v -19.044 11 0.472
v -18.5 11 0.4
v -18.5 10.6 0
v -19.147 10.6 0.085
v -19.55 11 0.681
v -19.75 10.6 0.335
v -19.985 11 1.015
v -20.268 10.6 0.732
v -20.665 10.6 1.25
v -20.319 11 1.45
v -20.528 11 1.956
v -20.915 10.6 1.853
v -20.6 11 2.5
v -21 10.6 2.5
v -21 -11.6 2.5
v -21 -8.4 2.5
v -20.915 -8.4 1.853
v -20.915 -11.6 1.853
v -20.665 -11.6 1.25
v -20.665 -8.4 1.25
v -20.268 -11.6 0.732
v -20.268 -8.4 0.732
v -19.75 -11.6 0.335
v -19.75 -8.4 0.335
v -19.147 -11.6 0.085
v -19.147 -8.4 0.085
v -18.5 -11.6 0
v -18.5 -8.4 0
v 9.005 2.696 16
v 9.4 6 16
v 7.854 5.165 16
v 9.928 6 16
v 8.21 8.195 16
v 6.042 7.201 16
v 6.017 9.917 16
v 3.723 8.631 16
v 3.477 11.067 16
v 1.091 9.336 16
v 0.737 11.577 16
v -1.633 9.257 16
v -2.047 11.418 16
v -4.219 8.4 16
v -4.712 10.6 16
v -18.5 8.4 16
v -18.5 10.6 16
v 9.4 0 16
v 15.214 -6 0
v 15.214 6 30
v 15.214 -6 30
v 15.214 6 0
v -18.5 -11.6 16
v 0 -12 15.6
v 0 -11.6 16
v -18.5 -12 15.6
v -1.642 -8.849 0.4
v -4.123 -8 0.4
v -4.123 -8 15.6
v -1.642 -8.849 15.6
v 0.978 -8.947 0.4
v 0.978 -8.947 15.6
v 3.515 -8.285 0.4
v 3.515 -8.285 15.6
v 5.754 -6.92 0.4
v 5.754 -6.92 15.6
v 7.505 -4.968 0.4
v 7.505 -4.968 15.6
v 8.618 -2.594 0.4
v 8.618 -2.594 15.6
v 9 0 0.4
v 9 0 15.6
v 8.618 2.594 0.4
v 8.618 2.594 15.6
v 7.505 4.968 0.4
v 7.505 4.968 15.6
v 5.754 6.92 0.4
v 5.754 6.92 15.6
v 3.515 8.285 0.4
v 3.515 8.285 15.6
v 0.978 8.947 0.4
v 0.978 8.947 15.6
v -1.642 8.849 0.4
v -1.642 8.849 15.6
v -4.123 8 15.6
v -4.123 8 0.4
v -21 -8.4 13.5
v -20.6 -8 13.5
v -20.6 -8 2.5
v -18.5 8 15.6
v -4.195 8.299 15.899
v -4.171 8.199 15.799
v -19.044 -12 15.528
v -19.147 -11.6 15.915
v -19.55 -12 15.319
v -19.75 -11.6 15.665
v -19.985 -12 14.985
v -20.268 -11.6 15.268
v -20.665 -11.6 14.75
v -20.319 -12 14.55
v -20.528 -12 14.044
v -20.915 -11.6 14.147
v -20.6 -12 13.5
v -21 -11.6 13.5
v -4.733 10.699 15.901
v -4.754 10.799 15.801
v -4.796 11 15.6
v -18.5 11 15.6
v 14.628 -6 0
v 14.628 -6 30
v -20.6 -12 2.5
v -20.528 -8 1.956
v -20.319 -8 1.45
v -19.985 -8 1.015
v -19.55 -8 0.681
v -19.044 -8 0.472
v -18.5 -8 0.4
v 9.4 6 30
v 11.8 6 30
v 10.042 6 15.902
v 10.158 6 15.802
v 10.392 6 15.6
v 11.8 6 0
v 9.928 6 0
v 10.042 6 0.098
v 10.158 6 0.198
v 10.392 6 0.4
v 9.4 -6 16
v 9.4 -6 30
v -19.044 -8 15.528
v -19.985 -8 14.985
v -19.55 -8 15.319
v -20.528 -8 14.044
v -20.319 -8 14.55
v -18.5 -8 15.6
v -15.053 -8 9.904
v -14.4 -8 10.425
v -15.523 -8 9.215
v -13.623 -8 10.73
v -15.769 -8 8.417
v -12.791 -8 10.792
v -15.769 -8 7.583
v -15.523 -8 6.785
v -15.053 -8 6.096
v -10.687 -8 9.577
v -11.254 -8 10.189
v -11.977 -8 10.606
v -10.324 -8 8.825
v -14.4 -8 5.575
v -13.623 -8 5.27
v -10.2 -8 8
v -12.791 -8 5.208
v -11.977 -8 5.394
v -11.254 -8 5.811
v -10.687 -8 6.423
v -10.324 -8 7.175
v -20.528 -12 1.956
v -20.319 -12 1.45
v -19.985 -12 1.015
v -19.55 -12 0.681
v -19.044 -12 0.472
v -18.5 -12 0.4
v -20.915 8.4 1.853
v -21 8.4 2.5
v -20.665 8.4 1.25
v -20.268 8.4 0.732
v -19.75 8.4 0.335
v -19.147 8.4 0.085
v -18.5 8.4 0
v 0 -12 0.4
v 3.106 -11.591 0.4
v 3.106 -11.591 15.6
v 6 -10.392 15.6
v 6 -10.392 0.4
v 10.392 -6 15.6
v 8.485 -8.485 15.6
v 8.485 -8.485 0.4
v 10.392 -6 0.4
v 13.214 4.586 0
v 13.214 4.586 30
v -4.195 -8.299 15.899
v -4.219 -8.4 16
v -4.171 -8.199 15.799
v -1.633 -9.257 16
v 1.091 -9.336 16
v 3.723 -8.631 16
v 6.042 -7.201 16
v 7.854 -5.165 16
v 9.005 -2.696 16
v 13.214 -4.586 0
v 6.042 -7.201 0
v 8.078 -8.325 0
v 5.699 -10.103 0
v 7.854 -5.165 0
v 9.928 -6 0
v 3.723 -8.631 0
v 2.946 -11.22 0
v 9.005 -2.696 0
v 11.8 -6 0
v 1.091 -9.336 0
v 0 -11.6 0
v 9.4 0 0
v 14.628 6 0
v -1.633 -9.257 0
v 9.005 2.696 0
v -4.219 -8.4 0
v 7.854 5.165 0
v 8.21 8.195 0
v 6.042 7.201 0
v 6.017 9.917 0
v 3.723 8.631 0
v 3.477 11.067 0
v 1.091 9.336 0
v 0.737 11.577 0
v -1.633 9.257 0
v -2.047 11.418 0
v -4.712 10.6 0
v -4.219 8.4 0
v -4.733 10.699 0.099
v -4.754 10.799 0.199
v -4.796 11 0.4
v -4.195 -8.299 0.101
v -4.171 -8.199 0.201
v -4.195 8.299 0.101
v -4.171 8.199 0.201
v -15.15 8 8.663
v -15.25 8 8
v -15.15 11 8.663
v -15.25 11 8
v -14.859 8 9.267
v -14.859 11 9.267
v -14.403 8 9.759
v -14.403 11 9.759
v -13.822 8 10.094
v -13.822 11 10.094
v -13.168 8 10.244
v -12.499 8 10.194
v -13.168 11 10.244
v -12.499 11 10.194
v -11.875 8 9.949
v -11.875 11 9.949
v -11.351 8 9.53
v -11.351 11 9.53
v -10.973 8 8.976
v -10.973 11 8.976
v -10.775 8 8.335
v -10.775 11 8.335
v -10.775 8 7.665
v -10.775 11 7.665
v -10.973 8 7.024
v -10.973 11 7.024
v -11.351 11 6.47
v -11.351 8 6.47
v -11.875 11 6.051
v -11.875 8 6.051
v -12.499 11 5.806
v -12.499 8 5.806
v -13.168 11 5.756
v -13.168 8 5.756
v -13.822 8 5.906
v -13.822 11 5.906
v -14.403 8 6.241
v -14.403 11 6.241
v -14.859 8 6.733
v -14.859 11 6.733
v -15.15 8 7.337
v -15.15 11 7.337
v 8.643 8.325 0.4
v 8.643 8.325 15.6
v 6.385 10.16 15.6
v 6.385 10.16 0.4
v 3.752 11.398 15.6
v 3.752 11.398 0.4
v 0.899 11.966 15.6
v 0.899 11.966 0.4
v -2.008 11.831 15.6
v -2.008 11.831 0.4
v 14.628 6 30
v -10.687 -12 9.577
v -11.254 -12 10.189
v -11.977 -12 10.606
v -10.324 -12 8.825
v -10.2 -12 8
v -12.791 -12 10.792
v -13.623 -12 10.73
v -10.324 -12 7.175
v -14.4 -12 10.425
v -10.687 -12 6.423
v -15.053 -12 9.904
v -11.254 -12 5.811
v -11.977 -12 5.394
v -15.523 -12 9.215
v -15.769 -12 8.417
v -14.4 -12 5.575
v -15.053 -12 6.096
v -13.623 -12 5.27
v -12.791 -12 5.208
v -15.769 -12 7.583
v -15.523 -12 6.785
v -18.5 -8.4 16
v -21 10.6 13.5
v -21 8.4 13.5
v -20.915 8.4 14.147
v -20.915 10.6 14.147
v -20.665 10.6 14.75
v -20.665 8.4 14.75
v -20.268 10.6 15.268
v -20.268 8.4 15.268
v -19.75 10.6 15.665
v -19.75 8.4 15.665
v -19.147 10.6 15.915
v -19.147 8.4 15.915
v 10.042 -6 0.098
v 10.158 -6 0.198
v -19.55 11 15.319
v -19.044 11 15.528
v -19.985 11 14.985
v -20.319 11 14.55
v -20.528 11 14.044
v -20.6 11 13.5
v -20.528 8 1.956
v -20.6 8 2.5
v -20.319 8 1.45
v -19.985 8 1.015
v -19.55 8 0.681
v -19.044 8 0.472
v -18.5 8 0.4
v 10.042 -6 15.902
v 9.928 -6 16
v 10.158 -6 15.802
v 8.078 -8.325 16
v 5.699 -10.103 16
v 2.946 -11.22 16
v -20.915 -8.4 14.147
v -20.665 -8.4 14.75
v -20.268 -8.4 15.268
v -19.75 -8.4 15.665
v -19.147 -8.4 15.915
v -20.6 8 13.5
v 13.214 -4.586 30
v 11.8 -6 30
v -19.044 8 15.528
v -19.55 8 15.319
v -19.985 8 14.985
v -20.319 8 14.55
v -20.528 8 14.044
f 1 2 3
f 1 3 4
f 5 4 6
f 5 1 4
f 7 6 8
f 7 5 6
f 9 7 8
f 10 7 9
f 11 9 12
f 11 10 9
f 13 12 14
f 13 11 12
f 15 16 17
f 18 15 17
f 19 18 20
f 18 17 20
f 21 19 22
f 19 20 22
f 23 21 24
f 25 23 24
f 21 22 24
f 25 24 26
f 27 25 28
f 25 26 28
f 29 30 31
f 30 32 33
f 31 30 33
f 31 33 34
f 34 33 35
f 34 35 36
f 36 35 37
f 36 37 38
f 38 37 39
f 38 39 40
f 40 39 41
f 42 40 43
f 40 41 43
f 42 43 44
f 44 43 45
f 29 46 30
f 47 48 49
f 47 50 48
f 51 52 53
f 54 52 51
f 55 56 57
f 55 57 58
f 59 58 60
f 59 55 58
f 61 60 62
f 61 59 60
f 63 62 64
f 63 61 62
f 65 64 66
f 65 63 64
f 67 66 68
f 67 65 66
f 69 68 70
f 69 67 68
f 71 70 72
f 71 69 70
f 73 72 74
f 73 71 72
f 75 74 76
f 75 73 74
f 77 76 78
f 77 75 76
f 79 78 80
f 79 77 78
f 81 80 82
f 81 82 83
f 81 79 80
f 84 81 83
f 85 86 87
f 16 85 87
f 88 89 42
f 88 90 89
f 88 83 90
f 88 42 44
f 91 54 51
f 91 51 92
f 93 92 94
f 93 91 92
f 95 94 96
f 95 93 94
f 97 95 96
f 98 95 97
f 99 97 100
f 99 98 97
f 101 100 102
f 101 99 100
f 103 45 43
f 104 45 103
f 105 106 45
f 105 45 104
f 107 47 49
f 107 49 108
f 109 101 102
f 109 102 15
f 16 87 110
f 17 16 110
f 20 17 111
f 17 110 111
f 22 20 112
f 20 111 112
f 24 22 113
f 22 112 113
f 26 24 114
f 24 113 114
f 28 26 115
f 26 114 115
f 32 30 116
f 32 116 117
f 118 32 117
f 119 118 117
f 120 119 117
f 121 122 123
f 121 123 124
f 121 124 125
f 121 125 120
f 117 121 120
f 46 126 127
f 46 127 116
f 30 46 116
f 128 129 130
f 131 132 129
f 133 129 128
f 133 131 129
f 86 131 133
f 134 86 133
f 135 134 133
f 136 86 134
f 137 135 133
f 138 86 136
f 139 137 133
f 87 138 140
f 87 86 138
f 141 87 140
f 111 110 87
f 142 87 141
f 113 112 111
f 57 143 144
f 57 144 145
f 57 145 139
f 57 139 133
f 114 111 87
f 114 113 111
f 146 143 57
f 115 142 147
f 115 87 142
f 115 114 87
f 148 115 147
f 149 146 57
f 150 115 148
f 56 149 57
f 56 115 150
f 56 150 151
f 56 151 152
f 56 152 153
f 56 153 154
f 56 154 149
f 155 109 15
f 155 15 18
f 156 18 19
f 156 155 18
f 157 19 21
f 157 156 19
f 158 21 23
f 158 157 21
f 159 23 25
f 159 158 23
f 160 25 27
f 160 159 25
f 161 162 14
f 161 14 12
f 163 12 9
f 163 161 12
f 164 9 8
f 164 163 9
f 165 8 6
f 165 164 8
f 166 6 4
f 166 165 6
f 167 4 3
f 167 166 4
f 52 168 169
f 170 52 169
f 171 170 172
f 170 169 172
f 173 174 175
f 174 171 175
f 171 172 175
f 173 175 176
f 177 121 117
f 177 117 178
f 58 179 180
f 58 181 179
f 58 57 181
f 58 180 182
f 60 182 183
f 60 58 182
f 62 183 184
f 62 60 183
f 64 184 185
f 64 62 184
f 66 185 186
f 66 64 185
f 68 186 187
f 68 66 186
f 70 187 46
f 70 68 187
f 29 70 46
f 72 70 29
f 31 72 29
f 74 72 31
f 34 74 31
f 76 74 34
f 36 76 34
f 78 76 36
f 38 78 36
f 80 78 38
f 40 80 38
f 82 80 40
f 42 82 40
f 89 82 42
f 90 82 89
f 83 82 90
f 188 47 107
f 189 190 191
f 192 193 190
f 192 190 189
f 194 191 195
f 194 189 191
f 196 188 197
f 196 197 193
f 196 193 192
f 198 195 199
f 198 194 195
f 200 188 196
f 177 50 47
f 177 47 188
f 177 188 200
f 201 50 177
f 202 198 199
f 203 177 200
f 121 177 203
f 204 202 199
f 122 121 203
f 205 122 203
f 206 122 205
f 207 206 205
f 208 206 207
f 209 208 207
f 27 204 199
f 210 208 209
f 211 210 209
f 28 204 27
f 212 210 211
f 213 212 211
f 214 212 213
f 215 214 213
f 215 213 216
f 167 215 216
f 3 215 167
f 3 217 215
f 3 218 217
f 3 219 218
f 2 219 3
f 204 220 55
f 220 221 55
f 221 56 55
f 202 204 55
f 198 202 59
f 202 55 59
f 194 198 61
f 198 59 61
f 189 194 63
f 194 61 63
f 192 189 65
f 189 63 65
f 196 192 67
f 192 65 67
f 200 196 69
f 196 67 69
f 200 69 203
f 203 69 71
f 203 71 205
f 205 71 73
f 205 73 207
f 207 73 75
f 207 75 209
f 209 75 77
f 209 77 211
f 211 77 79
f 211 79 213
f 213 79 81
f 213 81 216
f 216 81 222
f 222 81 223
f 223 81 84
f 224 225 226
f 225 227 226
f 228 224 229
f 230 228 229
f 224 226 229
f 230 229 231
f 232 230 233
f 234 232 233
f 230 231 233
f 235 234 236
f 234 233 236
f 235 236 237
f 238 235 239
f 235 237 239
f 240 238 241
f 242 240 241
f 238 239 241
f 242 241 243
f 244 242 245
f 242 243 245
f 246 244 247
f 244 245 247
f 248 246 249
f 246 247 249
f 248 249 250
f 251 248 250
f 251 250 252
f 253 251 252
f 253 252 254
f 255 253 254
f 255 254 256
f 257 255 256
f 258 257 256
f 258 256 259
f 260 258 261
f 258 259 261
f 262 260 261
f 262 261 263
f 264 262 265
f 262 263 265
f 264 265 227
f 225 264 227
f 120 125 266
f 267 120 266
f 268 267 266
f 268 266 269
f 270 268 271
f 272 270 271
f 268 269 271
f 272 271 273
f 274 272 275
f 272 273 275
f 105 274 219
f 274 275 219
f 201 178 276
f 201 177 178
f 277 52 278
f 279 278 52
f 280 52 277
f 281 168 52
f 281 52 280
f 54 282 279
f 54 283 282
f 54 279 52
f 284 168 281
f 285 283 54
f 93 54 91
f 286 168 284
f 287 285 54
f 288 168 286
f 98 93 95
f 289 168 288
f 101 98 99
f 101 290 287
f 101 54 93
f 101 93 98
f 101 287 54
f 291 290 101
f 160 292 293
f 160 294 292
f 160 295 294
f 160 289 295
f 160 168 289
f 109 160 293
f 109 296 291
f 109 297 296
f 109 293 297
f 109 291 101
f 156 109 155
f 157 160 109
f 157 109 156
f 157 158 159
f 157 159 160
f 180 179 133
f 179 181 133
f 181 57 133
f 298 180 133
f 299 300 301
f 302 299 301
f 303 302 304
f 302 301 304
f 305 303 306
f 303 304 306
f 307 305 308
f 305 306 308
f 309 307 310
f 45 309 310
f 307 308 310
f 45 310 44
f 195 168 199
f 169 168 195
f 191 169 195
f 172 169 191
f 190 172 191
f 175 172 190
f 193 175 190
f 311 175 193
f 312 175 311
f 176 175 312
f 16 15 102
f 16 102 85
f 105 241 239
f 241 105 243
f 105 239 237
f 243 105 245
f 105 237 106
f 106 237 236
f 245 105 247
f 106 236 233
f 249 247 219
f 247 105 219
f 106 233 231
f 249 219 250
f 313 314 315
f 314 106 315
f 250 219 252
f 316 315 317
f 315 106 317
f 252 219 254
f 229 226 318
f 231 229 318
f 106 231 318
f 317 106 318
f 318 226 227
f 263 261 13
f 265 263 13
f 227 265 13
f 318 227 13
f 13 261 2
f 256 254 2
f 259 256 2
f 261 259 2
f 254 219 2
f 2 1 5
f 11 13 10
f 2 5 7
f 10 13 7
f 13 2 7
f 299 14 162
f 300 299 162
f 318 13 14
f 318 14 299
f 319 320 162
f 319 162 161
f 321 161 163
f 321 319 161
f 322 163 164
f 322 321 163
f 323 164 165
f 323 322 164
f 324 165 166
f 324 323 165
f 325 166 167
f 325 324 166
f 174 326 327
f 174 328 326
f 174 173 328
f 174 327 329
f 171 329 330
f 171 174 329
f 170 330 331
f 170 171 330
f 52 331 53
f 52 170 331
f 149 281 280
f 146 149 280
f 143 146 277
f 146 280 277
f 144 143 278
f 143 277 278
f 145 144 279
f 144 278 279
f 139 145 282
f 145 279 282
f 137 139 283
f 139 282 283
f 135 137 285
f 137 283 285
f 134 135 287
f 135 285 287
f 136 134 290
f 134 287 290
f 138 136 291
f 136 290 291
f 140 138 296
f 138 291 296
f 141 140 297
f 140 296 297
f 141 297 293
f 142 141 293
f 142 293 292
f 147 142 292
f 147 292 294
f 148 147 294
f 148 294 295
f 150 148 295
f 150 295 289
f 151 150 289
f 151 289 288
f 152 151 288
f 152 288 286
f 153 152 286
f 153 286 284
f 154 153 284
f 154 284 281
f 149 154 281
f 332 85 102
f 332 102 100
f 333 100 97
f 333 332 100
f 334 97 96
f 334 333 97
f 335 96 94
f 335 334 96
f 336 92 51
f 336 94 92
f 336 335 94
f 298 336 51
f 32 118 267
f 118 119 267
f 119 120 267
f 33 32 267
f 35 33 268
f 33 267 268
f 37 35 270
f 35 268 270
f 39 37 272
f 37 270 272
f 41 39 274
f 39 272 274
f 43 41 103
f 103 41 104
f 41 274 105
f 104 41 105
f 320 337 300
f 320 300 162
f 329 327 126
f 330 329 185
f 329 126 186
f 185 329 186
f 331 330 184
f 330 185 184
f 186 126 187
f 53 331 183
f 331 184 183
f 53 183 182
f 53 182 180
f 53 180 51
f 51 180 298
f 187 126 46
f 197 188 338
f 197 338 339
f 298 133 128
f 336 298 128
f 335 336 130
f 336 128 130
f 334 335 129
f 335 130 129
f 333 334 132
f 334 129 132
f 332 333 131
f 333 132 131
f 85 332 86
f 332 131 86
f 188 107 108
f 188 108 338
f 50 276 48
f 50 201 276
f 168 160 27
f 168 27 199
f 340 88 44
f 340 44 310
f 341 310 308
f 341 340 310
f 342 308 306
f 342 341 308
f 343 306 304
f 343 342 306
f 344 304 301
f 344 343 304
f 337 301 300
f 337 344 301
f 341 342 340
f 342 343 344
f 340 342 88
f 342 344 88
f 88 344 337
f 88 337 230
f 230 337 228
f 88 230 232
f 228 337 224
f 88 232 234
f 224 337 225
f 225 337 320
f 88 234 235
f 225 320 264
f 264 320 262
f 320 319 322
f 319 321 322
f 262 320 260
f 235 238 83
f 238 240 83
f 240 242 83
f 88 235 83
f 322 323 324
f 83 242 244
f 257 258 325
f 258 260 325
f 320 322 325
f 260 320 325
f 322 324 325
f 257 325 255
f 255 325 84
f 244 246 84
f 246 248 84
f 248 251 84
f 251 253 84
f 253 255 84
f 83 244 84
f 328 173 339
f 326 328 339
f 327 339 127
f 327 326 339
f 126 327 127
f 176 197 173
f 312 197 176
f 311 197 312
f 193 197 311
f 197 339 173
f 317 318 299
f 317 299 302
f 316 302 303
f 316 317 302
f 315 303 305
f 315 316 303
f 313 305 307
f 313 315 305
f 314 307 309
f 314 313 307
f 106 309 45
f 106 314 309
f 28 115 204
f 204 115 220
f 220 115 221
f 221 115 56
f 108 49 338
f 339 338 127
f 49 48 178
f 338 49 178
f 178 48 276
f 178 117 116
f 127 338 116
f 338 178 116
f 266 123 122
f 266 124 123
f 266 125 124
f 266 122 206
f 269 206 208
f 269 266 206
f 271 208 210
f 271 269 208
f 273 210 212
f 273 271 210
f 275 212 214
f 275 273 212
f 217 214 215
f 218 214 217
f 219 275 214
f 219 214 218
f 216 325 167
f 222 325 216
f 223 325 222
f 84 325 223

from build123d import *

# Parameters (mm, degrees)
PAD003_DEPTH        = 16
FILLET_R            = 2.5
HOLE002_D           = 4.5
HOLE002_CBORE_D     = 5.6
HOLE002_CBORE_DEPTH = 4.4
CHAMFER005_SIZE     = 0.4
PAD014_DEPTH        = 14


with BuildPart() as part:
    # Sketch015 → Pad003 (new body)
    with BuildSketch(Plane.XY):
        with BuildLine():
            Line((10.392305, 6), (11.8, 6))
            Line((11.8, 6), (13.214214, 4.585786))
            Line((13.214214, 4.585786), (14.628427, 6))
            Line((14.628427, 6), (15.214214, 6))
            Line((15.214214, 6), (15.214214, -6))
            Line((15.214214, -6), (14.628427, -6))
            Line((14.628427, -6), (13.214214, -4.585786))
            Line((13.214214, -4.585786), (11.8, -6))
            Line((11.8, -6), (10.392305, -6))
            ThreePointArc((0, -12), (6, -10.392305), (10.392305, -6))
            Line((0, -12), (-21, -12))
            Line((-21, -12), (-21, -8))
            Line((-21, -8), (-4.123106, -8))
            ThreePointArc((-4.123106, -8), (9, 0), (-4.123106, 8))
            Line((-21, 8), (-4.123106, 8))
            Line((-21, 11), (-21, 8))
            Line((-4.795832, 11), (-21, 11))
            ThreePointArc((10.392305, 6), (3.75235, 11.39824), (-4.795832, 11))
        make_face()
    extrude(amount=PAD003_DEPTH)

    # Fillet
    fillet_edges = [part.edges().sort_by_distance(p)[0] for p in [
        (-21, 9.5, 16),
        (-21, -10, 16),
        (-21, -10, 0),
        (-21, 9.5, 0),
    ]]
    fillet(fillet_edges, radius=FILLET_R)

    # Hole002 (through all)
    with Locations(Plane.XZ.offset(12)):
        with Locations((-13, 8)):
            CounterBoreHole(HOLE002_D / 2, HOLE002_CBORE_D / 2, HOLE002_CBORE_DEPTH)

    # Chamfer005
    chamfer005_edges = [part.edges().sort_by_distance(p)[0] for p in [
        (9, 0, 0),
        (9, 0, 16),
        (-11.311553, 8, 0),
        (-11.311553, -8, 0),
        (3.75235, 11.39824, 0),
        (-11.647916, 11, 0),
        (6, -10.392305, 0),
        (-9.25, -12, 0),
        (3.75235, 11.39824, 16),
        (6, -10.392305, 16),
    ]]
    chamfer(chamfer005_edges, length=CHAMFER005_SIZE)

    # Sketch033 (on Face20 of Pad003) → Pad014 (join)
    with BuildSketch(Plane.XY.offset(16)):
        Polygon((15.214214, 6), (15.214214, -6), (14.628427, -6), (13.214214, -4.585786), (11.8, -6), (9.4, -6), (9.4, 6), (11.8, 6), (13.214214, 4.585786), (14.628427, 6), align=None)
    extrude(amount=PAD014_DEPTH)


solid = part.part
